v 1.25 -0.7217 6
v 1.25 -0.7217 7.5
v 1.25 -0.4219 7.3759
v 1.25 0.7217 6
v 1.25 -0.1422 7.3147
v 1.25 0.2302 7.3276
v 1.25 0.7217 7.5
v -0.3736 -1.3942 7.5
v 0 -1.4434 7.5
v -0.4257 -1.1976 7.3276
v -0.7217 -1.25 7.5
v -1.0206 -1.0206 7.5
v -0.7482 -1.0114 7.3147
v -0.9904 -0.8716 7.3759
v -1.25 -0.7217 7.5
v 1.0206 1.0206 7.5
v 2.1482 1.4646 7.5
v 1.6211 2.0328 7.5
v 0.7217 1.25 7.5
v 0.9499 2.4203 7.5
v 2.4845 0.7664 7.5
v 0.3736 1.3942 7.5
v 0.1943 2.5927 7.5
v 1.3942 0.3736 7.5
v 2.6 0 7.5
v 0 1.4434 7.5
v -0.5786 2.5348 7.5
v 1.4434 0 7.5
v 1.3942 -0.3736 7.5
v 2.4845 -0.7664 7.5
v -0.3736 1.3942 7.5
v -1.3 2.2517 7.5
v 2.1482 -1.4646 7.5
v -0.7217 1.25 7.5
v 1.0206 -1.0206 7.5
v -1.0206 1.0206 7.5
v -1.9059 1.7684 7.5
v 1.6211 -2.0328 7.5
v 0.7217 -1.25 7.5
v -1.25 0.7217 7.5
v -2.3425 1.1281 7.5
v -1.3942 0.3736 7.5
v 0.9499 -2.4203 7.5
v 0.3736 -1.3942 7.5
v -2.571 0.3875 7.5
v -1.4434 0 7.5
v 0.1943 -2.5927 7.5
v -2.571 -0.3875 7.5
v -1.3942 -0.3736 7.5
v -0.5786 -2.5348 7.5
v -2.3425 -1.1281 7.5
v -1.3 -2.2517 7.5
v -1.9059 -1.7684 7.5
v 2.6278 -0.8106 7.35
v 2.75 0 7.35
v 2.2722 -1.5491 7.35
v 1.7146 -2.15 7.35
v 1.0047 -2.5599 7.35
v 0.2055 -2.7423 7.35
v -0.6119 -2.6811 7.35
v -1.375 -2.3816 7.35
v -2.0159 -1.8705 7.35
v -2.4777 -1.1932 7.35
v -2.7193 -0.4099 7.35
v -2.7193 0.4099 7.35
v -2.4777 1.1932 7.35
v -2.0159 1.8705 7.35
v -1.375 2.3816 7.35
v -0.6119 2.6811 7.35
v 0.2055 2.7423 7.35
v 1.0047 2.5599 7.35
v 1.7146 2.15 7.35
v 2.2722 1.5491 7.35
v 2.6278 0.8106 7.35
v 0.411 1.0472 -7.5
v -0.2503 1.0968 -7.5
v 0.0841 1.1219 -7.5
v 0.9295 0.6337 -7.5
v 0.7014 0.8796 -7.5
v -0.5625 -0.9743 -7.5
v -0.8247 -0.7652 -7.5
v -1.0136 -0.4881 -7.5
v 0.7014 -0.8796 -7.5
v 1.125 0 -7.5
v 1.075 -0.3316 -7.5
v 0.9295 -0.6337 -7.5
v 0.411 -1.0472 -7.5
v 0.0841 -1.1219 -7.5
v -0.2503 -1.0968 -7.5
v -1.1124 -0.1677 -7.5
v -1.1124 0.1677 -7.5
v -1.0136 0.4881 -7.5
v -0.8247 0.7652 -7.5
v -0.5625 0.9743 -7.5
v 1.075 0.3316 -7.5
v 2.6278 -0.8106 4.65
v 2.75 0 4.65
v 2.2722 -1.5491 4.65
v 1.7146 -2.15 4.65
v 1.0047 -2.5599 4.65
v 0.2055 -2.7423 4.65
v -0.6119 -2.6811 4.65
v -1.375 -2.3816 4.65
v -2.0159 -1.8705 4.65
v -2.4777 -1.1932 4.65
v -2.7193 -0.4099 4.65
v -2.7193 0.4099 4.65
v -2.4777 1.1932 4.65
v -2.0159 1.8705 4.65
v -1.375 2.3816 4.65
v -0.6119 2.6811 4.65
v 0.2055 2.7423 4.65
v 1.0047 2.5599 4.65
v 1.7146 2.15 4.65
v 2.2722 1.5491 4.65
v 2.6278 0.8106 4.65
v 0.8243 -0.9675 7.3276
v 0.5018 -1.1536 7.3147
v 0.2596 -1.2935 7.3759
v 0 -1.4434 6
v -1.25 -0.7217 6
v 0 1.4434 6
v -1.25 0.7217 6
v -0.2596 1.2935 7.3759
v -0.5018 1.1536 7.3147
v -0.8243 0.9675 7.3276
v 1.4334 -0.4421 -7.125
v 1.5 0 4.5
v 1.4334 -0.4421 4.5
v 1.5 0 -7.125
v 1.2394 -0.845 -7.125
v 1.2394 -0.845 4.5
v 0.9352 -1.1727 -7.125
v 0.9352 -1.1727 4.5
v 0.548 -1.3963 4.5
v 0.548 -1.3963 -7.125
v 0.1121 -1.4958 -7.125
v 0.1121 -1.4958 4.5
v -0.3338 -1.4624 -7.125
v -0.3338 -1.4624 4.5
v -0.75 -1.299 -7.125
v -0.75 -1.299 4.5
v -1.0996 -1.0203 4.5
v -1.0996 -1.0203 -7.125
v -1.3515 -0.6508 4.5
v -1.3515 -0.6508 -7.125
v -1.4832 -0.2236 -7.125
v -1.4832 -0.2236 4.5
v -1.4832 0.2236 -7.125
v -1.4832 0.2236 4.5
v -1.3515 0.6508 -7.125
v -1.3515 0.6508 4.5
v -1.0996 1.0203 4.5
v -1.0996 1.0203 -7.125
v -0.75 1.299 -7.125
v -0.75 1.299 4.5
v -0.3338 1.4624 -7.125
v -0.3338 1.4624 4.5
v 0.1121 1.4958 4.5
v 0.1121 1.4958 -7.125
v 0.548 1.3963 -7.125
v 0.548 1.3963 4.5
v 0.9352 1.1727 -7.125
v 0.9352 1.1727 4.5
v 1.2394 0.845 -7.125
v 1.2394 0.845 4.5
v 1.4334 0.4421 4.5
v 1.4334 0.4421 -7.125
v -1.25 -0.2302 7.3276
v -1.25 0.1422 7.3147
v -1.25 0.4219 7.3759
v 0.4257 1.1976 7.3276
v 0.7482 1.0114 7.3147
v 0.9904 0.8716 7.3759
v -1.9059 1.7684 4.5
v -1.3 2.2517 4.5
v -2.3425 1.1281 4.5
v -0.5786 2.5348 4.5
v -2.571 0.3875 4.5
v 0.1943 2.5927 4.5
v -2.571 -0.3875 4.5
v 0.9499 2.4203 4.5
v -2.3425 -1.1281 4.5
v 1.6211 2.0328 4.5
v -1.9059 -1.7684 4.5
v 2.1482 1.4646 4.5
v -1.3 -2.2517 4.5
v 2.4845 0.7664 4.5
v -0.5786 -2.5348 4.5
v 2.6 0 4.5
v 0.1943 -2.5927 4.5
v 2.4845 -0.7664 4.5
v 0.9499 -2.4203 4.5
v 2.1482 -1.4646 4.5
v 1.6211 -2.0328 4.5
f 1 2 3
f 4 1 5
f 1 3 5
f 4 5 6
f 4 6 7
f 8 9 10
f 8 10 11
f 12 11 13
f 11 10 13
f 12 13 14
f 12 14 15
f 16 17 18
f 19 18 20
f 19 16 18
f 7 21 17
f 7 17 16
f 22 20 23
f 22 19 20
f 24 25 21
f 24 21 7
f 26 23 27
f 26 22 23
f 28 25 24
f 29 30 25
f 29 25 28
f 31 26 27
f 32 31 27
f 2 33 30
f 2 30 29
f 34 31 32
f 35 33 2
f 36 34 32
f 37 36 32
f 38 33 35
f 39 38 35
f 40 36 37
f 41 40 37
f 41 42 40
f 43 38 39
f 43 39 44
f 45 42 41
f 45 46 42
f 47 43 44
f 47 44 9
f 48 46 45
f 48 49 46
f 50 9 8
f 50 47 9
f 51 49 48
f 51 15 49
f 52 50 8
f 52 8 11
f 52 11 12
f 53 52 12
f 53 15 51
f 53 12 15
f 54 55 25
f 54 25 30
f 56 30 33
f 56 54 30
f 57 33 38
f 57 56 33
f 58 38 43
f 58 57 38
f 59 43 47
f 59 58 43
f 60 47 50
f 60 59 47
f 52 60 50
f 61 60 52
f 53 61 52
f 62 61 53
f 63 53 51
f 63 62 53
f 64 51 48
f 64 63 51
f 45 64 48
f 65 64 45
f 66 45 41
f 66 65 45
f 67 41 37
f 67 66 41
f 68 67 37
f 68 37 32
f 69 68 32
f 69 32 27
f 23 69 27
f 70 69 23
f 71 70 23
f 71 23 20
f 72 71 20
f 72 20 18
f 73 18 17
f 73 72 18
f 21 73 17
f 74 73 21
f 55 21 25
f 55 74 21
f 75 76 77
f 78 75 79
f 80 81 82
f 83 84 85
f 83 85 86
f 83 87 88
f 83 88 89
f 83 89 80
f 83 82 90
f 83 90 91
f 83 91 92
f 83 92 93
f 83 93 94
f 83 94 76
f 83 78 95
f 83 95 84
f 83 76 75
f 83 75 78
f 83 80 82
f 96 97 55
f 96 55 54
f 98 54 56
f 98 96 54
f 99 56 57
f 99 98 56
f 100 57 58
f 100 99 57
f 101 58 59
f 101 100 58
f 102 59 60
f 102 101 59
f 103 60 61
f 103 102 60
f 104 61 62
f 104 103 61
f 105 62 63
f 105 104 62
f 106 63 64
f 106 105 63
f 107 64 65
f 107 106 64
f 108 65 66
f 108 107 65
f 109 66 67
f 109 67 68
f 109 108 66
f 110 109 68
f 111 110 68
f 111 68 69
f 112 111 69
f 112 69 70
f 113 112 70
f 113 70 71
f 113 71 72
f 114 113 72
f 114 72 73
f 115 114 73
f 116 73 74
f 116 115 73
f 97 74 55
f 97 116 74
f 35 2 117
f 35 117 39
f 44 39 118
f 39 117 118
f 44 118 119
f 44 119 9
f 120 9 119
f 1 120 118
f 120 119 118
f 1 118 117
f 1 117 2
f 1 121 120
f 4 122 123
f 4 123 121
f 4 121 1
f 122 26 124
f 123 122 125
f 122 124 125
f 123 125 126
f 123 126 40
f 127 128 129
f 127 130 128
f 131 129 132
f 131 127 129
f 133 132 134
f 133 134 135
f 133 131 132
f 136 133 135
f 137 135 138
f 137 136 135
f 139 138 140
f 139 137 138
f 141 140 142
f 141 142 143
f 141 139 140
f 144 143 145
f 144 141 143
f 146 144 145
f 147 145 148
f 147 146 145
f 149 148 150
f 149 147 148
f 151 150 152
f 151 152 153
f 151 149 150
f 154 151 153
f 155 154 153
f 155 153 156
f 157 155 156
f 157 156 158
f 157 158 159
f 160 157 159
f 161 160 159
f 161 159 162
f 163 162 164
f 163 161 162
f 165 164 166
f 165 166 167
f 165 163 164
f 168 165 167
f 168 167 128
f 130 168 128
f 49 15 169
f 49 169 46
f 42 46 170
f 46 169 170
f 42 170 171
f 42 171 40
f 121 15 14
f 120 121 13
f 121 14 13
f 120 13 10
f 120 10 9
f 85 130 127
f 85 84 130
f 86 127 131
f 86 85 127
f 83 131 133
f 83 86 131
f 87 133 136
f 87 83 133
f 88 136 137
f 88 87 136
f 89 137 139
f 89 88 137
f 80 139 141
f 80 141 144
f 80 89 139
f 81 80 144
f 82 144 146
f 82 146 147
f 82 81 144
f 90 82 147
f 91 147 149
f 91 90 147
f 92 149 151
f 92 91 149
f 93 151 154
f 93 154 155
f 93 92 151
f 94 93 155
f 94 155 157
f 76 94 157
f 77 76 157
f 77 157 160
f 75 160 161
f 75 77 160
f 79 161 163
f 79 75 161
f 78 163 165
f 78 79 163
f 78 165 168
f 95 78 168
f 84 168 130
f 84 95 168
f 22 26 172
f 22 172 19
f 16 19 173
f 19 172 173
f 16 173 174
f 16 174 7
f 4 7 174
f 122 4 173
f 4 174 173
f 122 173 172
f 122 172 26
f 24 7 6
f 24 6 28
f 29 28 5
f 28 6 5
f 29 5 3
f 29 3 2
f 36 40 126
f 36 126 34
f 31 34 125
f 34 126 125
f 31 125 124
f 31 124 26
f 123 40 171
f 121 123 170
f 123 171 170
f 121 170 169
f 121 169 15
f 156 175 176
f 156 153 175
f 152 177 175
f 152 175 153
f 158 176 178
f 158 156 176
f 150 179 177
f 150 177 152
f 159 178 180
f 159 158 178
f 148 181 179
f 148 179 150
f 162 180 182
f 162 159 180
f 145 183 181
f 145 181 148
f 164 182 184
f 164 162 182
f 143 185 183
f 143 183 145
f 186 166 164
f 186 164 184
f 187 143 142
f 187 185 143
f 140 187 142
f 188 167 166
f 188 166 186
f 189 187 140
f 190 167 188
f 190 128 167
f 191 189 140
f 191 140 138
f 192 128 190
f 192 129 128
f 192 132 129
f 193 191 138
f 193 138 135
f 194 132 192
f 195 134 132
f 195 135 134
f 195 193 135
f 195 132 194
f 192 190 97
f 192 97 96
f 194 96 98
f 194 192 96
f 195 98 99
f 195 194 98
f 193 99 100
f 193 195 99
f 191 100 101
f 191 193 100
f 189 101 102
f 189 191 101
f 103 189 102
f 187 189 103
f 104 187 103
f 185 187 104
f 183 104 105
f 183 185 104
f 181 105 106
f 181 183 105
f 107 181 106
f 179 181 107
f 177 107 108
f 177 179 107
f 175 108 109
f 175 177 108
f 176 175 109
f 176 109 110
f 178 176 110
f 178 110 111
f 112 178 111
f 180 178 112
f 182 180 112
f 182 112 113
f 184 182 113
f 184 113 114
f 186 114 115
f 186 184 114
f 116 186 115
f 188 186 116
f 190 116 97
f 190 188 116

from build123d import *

# Parameters (mm, degrees)
CUT_EXTRUDE1_DEPTH = 1.5
CHAMFER1_SIZE      = 0.15


with BuildPart() as part:
    # Sketch2 → Revolve1 (revolve)
    with BuildSketch(Plane(origin=(0, 0, 0), x_dir=(0, 0, -1), z_dir=(1, 0, 0)), mode=Mode.PRIVATE) as revolve1_sk:
        Polygon((-7.5, 0), (-7.5, 2.75), (-4.5, 2.75), (-4.5, 1.5), (7.125, 1.5), (7.5, 1.125), (7.5, 0), align=None)
    revolve(revolve1_sk.sketch.rotate(Axis((0, 0, 7.5), (0, 0, -1)), 90), axis=Axis((0, 0, 7.5), (0, 0, -1)))

    # Sketch3 → Cut-Extrude1 (cut)
    with BuildSketch(Plane.XY.offset(7.5)):
        Polygon((0, 1.443375673), (-1.25, 0.721687836), (-1.25, -0.721687836), (0, -1.443375673), (1.25, -0.721687836), (1.25, 0.721687836), align=None)
    extrude(amount=-CUT_EXTRUDE1_DEPTH, mode=Mode.SUBTRACT)

    # Cut-Extrude2 cone 1 section (through the dimple's axis) → Cut-Extrude2 (revolve, cut)
    with BuildSketch(Plane(origin=(0, 0, 7.5), x_dir=(0, -1, 0), z_dir=(1, 0, 0))):
        Polygon((0, 0), (1.443375673, 0), (0, 1.443375673), align=None)
    revolve(axis=Axis((0, 0, 7.5), (0, 0, -1)), mode=Mode.SUBTRACT)

    # Chamfer1
    chamfer1_edges = [part.edges().sort_by_distance(p)[0] for p in [
        (-2.75, 0, 4.5),
        (-2.75, 0, 7.5),
    ]]
    chamfer(chamfer1_edges, length=CHAMFER1_SIZE)


solid = part.part
